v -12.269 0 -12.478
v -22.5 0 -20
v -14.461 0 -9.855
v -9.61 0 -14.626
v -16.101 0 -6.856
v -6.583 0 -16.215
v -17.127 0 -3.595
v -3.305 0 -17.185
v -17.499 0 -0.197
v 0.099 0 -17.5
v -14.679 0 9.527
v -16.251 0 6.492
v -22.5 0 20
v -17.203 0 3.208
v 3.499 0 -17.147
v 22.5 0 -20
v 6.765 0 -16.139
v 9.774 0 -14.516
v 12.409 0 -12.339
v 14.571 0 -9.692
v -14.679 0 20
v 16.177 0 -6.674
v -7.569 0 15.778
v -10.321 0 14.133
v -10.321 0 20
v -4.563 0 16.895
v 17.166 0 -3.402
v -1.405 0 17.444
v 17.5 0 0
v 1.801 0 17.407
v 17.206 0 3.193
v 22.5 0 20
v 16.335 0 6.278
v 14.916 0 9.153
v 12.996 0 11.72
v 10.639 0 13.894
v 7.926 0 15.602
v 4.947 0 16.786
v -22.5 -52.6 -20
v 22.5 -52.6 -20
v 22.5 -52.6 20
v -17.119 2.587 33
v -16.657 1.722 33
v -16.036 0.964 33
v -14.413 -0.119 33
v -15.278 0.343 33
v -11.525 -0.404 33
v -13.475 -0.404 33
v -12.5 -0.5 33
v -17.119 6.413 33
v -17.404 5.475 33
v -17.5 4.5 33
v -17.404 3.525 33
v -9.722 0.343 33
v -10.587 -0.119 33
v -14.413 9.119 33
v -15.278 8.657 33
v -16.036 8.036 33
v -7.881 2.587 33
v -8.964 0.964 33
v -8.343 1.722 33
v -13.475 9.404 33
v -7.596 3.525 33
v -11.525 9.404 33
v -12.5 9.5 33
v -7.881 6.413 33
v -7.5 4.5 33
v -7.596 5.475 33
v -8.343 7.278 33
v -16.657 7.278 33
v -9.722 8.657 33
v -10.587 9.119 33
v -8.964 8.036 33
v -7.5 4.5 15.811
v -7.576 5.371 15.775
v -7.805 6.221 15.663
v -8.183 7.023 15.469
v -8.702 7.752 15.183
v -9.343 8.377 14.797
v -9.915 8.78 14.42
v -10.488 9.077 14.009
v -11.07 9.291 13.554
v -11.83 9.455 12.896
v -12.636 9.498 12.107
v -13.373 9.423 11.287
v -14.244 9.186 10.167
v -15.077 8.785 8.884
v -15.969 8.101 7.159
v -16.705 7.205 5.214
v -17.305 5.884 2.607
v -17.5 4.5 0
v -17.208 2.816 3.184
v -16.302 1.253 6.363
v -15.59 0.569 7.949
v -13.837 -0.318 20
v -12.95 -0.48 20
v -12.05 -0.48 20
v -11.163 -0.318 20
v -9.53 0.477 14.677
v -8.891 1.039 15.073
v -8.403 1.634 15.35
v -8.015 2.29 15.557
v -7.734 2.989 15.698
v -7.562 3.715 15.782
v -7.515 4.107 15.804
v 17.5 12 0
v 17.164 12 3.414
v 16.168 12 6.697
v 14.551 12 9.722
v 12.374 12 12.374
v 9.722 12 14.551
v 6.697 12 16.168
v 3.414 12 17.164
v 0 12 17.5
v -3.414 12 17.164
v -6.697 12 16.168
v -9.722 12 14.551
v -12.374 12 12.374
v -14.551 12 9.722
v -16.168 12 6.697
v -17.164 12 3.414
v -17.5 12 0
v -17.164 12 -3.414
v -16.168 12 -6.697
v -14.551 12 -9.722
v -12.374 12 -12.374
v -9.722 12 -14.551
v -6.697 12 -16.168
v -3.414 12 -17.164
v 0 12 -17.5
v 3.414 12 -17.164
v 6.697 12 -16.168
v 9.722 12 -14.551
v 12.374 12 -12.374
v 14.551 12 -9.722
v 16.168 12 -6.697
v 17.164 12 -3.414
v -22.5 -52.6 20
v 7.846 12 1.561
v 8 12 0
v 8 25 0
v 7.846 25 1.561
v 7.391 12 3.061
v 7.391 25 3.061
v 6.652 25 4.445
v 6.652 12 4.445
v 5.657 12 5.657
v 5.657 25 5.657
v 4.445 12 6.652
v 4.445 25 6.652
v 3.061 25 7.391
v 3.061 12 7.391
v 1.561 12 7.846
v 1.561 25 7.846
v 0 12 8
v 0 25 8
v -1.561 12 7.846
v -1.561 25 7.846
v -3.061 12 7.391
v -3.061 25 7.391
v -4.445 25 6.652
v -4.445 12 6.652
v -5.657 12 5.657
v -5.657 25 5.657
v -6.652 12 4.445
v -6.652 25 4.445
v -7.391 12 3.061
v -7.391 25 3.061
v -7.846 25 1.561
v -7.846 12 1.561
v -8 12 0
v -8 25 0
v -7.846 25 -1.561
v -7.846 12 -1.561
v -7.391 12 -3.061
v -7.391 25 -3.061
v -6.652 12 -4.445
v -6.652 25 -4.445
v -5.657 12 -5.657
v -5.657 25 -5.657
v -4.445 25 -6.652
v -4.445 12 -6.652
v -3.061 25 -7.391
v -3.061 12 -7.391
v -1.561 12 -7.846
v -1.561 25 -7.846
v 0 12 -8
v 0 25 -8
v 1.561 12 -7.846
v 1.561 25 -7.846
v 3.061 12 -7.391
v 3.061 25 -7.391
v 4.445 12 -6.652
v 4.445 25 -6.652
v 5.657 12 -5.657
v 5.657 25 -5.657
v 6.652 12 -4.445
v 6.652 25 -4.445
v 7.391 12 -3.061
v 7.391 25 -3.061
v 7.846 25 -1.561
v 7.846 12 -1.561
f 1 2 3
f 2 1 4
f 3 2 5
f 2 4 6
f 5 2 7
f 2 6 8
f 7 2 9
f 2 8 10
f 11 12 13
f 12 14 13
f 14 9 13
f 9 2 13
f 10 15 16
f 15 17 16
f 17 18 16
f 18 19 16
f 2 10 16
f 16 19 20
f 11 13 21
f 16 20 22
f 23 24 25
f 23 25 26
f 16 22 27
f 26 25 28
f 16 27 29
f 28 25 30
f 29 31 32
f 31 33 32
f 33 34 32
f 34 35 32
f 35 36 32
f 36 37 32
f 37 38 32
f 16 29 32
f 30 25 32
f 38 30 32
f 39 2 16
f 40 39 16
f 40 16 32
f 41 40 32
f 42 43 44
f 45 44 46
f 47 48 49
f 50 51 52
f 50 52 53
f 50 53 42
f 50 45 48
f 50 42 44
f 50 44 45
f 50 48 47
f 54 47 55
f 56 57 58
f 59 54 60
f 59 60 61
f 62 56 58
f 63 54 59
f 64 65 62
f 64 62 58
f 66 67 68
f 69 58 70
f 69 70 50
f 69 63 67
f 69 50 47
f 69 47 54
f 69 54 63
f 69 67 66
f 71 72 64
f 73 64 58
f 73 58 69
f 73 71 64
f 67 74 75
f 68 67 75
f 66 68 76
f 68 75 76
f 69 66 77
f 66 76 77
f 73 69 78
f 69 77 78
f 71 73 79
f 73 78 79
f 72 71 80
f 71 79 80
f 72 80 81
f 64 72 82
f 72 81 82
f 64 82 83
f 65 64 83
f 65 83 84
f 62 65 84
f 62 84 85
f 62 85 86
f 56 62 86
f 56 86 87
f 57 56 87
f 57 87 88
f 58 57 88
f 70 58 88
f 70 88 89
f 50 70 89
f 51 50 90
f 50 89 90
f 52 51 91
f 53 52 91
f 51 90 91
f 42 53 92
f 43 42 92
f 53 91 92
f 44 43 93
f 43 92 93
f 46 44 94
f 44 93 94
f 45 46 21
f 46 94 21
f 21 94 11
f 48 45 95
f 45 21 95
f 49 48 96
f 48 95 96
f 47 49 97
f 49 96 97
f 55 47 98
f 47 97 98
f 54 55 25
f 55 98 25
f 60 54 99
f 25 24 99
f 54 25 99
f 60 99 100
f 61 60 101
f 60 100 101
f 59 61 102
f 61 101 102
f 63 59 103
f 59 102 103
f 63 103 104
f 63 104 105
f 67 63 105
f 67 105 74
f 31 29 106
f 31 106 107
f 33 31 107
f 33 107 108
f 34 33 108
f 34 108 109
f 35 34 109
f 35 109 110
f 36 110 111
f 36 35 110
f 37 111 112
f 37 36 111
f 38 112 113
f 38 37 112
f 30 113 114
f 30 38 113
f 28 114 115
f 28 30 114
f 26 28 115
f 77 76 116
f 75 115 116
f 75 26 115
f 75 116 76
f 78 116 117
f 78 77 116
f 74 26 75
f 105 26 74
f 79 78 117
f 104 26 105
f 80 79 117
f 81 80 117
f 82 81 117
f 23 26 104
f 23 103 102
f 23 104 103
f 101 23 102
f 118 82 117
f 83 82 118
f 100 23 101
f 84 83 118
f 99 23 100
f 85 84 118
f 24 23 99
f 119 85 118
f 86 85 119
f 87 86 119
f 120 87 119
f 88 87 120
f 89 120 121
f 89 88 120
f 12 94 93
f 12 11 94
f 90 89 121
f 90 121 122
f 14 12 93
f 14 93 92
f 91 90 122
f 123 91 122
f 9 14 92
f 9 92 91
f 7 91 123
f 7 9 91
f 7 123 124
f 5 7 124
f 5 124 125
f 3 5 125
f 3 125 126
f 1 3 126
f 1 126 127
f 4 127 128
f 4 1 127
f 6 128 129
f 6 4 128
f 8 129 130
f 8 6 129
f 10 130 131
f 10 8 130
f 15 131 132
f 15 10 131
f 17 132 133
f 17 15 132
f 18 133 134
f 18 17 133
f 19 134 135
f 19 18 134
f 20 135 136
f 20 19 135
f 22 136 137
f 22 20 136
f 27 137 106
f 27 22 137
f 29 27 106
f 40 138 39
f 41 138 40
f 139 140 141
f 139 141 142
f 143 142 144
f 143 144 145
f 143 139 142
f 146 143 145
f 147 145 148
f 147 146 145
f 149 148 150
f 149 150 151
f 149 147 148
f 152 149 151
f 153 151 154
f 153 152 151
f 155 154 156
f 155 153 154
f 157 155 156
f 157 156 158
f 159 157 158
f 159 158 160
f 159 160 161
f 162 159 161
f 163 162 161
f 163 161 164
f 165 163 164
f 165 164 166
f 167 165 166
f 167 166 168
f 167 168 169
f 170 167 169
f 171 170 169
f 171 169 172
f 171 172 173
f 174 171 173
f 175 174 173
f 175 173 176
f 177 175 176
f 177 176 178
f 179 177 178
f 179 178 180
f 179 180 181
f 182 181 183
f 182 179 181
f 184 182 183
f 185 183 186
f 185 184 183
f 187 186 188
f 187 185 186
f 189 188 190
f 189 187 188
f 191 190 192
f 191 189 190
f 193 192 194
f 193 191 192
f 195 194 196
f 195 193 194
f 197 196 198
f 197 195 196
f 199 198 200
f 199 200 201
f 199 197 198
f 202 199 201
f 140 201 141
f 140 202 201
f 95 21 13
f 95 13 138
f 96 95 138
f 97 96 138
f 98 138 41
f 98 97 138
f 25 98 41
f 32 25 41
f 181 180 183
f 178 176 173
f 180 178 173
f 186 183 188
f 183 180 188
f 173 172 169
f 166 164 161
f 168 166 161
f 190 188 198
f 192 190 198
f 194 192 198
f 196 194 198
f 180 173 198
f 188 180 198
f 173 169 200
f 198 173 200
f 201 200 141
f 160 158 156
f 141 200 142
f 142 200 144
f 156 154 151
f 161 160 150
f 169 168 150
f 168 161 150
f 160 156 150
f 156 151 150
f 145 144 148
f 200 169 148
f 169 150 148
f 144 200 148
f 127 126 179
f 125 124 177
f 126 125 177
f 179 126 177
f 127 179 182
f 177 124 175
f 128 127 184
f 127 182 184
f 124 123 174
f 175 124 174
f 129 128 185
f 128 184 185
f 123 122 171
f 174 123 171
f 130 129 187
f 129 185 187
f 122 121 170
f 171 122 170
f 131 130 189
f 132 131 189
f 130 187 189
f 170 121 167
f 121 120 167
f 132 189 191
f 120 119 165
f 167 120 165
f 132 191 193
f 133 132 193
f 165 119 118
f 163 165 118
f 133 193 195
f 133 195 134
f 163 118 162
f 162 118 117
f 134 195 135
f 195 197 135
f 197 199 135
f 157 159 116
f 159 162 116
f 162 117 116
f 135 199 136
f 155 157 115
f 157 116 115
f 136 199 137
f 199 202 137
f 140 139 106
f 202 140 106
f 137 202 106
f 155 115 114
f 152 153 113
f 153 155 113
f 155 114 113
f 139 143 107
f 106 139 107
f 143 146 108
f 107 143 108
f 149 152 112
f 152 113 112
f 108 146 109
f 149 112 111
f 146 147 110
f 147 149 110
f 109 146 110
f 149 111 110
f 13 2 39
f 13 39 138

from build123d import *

# Parameters (mm, degrees)
F0_W     = 45
F0_H     = 40
F0_R     = 17.5
F0_R_2   = 8
F1_DEPTH = 52.6
F2_DEPTH = 12
F3_DEPTH = 25
F4_R     = 5
F5_DEPTH = 33


with BuildPart() as f1:
    # F0 (on Front) → F1 (new body)
    with BuildSketch(Plane.XZ):
        Rectangle(F0_W, F0_H)
        Circle(F0_R, mode=Mode.SUBTRACT)
        Circle(F0_R)
        Circle(F0_R_2, mode=Mode.SUBTRACT)
        Circle(F0_R_2)
    extrude(amount=F1_DEPTH)

    # F0 (on Front) → F2 (join)
    with BuildSketch(Plane.XZ):
        Circle(F0_R)
        Circle(F0_R_2, mode=Mode.SUBTRACT)
    extrude(amount=-F2_DEPTH)

    # F0 (on Front) → F3 (join)
    with BuildSketch(Plane.XZ):
        Circle(F0_R_2)
    extrude(amount=-F3_DEPTH)

    # F4 (on Top) → F5 (join)
    with BuildSketch(Plane.XY):
        with Locations((-12.5, 4.5)):
            Circle(F4_R)
    extrude(amount=F5_DEPTH)


solid = f1.part
